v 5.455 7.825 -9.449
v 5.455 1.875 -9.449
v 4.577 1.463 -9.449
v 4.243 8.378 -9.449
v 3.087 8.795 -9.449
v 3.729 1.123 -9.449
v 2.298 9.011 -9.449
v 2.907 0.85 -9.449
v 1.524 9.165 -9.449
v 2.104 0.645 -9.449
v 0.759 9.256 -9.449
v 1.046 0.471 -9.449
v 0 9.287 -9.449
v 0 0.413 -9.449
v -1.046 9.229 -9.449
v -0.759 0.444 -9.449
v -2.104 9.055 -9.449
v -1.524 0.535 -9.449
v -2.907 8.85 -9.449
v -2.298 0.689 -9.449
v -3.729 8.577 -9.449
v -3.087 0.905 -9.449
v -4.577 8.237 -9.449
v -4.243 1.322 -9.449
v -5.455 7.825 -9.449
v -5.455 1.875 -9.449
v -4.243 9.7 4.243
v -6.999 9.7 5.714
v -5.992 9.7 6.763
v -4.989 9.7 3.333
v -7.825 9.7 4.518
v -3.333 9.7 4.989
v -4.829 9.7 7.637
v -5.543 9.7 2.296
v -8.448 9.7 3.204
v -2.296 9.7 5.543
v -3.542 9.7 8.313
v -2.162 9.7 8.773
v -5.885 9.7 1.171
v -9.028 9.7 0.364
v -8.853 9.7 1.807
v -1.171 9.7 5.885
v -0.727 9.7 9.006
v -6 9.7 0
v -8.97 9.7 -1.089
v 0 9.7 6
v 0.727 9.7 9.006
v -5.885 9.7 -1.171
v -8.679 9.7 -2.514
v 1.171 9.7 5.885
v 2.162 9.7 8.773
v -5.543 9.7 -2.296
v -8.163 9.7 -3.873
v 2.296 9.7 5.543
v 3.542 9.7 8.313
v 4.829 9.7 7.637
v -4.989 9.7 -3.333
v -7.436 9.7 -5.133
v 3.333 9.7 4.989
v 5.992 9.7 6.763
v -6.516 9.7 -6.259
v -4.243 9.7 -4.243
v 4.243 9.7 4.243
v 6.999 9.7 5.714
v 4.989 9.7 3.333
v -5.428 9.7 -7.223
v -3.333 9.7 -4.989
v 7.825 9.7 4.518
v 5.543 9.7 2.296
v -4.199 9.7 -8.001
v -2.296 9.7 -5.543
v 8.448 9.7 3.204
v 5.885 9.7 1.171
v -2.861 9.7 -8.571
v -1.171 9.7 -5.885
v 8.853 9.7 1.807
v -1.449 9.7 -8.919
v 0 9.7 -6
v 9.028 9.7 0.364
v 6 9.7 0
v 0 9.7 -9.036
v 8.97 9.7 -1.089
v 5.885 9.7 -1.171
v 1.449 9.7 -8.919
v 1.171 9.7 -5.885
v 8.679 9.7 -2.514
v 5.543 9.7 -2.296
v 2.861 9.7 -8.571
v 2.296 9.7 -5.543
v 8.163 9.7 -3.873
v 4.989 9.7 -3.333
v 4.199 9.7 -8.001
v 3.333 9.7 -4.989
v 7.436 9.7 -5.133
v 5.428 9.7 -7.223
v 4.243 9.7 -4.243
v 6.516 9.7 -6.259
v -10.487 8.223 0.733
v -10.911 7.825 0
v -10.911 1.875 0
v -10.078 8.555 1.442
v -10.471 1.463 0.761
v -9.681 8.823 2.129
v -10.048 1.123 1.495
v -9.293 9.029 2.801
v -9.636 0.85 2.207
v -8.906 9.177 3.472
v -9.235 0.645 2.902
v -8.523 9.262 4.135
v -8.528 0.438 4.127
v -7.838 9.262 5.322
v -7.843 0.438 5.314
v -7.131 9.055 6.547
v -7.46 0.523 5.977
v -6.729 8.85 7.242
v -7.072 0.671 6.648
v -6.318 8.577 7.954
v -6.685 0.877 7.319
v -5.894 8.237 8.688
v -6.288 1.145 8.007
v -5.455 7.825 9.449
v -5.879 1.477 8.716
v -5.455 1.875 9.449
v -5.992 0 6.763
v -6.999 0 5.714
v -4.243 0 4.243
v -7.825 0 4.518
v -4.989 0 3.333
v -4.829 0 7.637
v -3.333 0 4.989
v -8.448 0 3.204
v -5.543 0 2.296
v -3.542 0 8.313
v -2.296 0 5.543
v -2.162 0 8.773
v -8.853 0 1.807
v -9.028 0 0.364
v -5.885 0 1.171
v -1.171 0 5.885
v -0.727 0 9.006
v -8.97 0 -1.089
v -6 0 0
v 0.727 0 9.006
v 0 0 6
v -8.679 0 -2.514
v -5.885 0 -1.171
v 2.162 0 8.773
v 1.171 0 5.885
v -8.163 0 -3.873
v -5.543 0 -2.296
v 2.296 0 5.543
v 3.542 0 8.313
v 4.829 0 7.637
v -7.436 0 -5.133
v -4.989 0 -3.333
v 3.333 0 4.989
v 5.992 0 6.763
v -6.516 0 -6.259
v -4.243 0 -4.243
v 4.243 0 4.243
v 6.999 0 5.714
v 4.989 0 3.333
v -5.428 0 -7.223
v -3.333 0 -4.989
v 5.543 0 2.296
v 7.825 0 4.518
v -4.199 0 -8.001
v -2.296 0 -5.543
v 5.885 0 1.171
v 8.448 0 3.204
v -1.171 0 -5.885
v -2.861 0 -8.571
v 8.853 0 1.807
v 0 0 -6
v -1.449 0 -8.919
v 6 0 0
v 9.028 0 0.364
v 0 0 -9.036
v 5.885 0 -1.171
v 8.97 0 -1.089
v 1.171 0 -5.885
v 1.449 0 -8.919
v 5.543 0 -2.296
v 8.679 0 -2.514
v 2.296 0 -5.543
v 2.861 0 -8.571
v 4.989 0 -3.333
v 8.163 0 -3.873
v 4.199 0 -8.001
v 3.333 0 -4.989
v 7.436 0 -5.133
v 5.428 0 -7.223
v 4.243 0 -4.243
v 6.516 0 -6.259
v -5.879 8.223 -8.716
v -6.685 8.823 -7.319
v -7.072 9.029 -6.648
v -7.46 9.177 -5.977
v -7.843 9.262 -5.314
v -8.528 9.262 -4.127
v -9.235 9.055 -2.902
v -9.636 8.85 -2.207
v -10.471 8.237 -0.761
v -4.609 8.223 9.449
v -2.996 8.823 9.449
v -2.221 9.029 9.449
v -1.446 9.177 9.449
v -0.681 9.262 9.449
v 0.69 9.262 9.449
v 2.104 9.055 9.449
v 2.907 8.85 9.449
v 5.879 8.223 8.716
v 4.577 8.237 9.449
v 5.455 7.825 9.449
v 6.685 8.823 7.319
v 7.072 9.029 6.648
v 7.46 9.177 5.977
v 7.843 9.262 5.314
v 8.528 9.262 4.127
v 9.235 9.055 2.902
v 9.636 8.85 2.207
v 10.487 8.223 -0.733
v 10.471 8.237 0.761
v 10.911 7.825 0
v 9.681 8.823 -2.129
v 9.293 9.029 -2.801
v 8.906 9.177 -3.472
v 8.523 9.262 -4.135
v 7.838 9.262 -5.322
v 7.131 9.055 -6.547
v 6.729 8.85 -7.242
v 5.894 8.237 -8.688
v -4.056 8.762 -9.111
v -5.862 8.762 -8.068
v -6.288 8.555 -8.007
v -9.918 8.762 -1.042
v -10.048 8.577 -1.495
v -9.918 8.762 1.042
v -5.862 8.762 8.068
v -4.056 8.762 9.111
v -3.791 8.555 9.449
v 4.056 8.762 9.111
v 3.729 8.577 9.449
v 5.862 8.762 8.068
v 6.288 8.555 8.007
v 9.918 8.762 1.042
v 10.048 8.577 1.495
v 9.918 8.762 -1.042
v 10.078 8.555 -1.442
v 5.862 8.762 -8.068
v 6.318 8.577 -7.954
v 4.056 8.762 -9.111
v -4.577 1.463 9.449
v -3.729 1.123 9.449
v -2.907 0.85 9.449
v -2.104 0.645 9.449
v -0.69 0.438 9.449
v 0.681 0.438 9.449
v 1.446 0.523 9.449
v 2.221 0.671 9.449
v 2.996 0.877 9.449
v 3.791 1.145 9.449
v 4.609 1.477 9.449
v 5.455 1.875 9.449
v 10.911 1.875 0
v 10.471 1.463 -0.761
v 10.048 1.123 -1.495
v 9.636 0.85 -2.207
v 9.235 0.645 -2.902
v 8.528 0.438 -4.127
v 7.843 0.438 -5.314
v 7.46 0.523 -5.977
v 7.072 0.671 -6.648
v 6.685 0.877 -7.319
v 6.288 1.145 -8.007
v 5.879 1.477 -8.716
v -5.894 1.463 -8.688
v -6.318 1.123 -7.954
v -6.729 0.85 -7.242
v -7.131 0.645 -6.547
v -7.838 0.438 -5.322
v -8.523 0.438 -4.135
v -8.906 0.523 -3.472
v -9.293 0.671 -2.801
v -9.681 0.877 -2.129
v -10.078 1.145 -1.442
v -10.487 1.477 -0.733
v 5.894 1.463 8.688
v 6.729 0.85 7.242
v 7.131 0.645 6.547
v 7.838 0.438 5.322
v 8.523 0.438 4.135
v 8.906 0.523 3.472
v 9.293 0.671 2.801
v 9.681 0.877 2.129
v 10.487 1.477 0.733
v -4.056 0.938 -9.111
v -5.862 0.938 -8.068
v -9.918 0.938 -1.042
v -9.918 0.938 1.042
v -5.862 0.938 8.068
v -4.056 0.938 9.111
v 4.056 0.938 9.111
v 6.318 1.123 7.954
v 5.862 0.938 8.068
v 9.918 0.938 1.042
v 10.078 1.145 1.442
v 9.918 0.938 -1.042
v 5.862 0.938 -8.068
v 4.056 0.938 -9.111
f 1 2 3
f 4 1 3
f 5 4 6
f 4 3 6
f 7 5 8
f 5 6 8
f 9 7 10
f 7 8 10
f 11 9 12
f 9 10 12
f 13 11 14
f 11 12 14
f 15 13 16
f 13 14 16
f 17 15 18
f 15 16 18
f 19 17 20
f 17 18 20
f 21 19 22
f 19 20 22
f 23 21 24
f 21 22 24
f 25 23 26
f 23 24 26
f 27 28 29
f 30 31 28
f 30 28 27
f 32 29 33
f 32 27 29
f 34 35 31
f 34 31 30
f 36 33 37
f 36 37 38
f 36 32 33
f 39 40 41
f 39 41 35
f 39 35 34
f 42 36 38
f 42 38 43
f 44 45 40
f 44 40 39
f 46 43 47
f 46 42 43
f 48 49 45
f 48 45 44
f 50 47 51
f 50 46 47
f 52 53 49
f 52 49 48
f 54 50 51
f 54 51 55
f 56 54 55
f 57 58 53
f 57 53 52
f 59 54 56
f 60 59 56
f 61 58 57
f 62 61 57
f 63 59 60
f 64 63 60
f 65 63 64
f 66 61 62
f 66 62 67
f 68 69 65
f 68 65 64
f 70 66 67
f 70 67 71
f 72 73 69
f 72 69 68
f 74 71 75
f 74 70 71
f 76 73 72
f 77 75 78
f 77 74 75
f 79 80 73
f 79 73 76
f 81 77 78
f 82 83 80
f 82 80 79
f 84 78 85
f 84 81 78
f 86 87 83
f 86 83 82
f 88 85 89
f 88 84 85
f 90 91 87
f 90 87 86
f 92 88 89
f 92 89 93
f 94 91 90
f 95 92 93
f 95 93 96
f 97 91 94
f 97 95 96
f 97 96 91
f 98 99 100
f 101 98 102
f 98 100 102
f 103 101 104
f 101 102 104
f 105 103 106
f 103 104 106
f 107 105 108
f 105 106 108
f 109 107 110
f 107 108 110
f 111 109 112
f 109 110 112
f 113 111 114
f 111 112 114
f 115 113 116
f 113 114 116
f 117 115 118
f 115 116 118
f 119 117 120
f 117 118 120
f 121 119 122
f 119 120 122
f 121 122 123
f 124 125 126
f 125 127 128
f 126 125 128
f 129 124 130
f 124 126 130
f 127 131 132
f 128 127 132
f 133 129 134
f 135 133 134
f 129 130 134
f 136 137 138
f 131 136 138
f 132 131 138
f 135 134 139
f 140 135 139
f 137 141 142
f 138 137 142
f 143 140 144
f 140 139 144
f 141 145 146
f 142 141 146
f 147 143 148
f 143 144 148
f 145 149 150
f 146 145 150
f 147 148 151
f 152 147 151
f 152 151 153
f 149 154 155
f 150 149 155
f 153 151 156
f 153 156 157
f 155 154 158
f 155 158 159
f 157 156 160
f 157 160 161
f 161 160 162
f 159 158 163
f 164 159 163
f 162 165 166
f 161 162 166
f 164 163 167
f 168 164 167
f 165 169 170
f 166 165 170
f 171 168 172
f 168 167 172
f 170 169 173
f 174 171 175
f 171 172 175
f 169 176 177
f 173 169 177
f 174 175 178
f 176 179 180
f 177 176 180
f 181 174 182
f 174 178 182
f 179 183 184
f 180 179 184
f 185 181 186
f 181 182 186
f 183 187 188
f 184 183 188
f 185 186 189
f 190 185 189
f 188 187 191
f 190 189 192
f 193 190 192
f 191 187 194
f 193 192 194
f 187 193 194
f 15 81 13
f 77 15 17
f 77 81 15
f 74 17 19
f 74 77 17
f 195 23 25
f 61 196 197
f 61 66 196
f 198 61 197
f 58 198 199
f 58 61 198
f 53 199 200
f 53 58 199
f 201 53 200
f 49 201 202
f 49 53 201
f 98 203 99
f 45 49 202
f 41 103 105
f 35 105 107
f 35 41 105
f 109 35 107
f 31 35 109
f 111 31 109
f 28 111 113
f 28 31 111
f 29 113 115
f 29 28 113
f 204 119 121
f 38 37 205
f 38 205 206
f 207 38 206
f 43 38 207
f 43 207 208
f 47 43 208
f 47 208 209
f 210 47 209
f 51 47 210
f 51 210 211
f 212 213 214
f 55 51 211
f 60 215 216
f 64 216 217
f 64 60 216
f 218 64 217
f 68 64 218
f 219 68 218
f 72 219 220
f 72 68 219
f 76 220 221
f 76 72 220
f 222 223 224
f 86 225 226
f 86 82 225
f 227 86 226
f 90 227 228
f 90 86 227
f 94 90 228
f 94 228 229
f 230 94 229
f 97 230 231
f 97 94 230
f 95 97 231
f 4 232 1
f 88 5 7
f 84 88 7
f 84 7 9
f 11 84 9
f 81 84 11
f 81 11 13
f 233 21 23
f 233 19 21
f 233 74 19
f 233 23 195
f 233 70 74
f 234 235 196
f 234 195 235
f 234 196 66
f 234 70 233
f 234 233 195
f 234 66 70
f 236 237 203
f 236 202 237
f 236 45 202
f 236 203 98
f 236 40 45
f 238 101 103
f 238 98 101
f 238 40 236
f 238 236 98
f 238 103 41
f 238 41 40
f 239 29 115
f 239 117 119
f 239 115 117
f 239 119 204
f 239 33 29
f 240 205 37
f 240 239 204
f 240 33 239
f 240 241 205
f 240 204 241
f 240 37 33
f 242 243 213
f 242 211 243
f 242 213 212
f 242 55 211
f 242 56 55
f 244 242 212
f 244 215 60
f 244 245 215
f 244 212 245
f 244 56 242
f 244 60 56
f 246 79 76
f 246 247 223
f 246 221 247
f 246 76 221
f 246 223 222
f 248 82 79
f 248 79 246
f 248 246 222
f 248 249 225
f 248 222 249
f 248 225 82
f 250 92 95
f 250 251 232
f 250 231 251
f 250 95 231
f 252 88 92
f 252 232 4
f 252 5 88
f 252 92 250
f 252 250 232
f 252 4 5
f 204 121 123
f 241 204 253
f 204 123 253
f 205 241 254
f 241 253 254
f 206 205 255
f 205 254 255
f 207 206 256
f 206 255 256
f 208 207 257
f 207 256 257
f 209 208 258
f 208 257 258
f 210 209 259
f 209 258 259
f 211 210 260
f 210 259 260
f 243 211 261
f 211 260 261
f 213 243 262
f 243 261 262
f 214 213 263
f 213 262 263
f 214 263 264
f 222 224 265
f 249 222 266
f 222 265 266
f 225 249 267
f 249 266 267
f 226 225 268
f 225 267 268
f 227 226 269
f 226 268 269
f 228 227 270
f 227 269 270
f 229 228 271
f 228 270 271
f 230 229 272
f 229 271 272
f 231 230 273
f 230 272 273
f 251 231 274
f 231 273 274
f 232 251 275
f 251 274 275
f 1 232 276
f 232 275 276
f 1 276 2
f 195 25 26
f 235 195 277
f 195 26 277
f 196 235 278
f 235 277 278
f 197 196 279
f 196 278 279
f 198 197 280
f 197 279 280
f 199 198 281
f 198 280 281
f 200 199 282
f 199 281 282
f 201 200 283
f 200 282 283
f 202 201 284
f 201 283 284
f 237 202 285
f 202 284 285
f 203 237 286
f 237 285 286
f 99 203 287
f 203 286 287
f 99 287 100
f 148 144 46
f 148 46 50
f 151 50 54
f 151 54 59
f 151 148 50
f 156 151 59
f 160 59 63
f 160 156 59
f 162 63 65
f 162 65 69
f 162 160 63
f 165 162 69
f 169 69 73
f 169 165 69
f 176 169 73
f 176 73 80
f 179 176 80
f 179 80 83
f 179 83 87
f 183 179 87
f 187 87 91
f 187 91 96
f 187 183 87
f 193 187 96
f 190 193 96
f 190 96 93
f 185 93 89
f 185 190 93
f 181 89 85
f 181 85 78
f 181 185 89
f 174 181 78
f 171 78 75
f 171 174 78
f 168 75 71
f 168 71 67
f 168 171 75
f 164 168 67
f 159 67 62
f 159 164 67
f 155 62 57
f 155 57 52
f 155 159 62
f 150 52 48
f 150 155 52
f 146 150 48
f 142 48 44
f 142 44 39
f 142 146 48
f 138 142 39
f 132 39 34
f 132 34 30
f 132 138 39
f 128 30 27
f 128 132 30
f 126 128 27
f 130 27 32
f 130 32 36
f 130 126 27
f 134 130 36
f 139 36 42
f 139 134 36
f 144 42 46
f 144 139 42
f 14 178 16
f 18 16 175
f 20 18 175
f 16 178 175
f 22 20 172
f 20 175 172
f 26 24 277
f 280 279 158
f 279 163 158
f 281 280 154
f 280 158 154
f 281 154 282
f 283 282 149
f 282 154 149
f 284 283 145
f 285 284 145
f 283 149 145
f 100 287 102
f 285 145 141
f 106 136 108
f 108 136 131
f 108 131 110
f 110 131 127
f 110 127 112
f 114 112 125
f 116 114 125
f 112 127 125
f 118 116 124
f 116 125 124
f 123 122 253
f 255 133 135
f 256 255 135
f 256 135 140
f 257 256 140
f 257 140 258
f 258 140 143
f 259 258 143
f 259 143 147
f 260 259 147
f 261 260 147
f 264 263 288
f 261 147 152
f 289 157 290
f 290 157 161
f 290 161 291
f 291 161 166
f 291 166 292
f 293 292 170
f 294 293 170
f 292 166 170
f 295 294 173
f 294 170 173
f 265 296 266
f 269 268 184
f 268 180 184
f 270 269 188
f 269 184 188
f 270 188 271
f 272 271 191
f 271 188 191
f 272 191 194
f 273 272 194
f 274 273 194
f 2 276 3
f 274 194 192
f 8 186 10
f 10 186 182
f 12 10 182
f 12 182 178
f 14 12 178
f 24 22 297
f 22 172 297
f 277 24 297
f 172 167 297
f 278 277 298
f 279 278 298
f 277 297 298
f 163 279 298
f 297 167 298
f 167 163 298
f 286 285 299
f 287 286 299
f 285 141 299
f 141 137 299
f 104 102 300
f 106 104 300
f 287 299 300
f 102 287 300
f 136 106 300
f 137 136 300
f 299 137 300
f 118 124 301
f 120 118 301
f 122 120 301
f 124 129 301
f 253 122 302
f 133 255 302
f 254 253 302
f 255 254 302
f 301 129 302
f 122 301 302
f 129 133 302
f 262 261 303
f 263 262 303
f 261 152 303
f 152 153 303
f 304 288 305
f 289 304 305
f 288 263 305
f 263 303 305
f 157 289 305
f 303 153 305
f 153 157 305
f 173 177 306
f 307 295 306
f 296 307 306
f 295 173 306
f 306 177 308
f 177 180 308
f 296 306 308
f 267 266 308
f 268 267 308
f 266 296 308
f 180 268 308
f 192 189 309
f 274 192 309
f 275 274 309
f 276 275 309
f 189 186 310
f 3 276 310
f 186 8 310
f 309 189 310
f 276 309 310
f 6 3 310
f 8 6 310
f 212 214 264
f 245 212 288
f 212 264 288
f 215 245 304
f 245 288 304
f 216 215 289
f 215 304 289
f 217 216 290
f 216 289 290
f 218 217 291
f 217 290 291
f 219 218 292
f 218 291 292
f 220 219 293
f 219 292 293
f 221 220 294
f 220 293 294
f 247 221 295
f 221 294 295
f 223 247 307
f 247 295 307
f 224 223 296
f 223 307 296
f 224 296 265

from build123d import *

# Parameters (mm, degrees)
SKETCH1_R           = 6
BOSS_EXTRUDE1_DEPTH = 9.7


with BuildPart() as part:
    # Sketch1 → Boss-Extrude1 (new body)
    with BuildSketch(Plane(origin=(0, 0, 0), x_dir=(1, 0, 0), z_dir=(0, 1, 0))):
        Polygon((-10.910534447, 0), (-5.455267224, -9.4488), (5.455267224, -9.4488), (10.910534447, 0), (5.455267224, 9.4488), (-5.455267224, 9.4488), align=None)
        with Locations(Location((0, 0, 0), (0, 0, 270))):
            Circle(SKETCH1_R, mode=Mode.SUBTRACT)
    extrude(amount=BOSS_EXTRUDE1_DEPTH)

    # Sketch3 → Cut-Revolve3 (revolve, cut)
    with BuildSketch(Plane.XY, mode=Mode.PRIVATE) as cut_revolve3_sk:
        Polygon((-9.035534447, 9.7), (-10.910534447, 9.7), (-10.910534447, 7.825), align=None)
    revolve(cut_revolve3_sk.sketch.rotate(Axis((0, 0, 0), (0, 1, 0)), 270), axis=Axis((0, 0, 0), (0, 1, 0)), mode=Mode.SUBTRACT)

    # Sketch4 → Cut-Revolve4 (revolve, cut)
    with BuildSketch(Plane.XY, mode=Mode.PRIVATE) as cut_revolve4_sk:
        Polygon((-9.035534447, 0), (-10.910534447, 0), (-10.910534447, 1.875), align=None)
    revolve(cut_revolve4_sk.sketch.rotate(Axis((0, 0, 0), (0, 1, 0)), 270), axis=Axis((0, 0, 0), (0, 1, 0)), mode=Mode.SUBTRACT)


solid = part.part
